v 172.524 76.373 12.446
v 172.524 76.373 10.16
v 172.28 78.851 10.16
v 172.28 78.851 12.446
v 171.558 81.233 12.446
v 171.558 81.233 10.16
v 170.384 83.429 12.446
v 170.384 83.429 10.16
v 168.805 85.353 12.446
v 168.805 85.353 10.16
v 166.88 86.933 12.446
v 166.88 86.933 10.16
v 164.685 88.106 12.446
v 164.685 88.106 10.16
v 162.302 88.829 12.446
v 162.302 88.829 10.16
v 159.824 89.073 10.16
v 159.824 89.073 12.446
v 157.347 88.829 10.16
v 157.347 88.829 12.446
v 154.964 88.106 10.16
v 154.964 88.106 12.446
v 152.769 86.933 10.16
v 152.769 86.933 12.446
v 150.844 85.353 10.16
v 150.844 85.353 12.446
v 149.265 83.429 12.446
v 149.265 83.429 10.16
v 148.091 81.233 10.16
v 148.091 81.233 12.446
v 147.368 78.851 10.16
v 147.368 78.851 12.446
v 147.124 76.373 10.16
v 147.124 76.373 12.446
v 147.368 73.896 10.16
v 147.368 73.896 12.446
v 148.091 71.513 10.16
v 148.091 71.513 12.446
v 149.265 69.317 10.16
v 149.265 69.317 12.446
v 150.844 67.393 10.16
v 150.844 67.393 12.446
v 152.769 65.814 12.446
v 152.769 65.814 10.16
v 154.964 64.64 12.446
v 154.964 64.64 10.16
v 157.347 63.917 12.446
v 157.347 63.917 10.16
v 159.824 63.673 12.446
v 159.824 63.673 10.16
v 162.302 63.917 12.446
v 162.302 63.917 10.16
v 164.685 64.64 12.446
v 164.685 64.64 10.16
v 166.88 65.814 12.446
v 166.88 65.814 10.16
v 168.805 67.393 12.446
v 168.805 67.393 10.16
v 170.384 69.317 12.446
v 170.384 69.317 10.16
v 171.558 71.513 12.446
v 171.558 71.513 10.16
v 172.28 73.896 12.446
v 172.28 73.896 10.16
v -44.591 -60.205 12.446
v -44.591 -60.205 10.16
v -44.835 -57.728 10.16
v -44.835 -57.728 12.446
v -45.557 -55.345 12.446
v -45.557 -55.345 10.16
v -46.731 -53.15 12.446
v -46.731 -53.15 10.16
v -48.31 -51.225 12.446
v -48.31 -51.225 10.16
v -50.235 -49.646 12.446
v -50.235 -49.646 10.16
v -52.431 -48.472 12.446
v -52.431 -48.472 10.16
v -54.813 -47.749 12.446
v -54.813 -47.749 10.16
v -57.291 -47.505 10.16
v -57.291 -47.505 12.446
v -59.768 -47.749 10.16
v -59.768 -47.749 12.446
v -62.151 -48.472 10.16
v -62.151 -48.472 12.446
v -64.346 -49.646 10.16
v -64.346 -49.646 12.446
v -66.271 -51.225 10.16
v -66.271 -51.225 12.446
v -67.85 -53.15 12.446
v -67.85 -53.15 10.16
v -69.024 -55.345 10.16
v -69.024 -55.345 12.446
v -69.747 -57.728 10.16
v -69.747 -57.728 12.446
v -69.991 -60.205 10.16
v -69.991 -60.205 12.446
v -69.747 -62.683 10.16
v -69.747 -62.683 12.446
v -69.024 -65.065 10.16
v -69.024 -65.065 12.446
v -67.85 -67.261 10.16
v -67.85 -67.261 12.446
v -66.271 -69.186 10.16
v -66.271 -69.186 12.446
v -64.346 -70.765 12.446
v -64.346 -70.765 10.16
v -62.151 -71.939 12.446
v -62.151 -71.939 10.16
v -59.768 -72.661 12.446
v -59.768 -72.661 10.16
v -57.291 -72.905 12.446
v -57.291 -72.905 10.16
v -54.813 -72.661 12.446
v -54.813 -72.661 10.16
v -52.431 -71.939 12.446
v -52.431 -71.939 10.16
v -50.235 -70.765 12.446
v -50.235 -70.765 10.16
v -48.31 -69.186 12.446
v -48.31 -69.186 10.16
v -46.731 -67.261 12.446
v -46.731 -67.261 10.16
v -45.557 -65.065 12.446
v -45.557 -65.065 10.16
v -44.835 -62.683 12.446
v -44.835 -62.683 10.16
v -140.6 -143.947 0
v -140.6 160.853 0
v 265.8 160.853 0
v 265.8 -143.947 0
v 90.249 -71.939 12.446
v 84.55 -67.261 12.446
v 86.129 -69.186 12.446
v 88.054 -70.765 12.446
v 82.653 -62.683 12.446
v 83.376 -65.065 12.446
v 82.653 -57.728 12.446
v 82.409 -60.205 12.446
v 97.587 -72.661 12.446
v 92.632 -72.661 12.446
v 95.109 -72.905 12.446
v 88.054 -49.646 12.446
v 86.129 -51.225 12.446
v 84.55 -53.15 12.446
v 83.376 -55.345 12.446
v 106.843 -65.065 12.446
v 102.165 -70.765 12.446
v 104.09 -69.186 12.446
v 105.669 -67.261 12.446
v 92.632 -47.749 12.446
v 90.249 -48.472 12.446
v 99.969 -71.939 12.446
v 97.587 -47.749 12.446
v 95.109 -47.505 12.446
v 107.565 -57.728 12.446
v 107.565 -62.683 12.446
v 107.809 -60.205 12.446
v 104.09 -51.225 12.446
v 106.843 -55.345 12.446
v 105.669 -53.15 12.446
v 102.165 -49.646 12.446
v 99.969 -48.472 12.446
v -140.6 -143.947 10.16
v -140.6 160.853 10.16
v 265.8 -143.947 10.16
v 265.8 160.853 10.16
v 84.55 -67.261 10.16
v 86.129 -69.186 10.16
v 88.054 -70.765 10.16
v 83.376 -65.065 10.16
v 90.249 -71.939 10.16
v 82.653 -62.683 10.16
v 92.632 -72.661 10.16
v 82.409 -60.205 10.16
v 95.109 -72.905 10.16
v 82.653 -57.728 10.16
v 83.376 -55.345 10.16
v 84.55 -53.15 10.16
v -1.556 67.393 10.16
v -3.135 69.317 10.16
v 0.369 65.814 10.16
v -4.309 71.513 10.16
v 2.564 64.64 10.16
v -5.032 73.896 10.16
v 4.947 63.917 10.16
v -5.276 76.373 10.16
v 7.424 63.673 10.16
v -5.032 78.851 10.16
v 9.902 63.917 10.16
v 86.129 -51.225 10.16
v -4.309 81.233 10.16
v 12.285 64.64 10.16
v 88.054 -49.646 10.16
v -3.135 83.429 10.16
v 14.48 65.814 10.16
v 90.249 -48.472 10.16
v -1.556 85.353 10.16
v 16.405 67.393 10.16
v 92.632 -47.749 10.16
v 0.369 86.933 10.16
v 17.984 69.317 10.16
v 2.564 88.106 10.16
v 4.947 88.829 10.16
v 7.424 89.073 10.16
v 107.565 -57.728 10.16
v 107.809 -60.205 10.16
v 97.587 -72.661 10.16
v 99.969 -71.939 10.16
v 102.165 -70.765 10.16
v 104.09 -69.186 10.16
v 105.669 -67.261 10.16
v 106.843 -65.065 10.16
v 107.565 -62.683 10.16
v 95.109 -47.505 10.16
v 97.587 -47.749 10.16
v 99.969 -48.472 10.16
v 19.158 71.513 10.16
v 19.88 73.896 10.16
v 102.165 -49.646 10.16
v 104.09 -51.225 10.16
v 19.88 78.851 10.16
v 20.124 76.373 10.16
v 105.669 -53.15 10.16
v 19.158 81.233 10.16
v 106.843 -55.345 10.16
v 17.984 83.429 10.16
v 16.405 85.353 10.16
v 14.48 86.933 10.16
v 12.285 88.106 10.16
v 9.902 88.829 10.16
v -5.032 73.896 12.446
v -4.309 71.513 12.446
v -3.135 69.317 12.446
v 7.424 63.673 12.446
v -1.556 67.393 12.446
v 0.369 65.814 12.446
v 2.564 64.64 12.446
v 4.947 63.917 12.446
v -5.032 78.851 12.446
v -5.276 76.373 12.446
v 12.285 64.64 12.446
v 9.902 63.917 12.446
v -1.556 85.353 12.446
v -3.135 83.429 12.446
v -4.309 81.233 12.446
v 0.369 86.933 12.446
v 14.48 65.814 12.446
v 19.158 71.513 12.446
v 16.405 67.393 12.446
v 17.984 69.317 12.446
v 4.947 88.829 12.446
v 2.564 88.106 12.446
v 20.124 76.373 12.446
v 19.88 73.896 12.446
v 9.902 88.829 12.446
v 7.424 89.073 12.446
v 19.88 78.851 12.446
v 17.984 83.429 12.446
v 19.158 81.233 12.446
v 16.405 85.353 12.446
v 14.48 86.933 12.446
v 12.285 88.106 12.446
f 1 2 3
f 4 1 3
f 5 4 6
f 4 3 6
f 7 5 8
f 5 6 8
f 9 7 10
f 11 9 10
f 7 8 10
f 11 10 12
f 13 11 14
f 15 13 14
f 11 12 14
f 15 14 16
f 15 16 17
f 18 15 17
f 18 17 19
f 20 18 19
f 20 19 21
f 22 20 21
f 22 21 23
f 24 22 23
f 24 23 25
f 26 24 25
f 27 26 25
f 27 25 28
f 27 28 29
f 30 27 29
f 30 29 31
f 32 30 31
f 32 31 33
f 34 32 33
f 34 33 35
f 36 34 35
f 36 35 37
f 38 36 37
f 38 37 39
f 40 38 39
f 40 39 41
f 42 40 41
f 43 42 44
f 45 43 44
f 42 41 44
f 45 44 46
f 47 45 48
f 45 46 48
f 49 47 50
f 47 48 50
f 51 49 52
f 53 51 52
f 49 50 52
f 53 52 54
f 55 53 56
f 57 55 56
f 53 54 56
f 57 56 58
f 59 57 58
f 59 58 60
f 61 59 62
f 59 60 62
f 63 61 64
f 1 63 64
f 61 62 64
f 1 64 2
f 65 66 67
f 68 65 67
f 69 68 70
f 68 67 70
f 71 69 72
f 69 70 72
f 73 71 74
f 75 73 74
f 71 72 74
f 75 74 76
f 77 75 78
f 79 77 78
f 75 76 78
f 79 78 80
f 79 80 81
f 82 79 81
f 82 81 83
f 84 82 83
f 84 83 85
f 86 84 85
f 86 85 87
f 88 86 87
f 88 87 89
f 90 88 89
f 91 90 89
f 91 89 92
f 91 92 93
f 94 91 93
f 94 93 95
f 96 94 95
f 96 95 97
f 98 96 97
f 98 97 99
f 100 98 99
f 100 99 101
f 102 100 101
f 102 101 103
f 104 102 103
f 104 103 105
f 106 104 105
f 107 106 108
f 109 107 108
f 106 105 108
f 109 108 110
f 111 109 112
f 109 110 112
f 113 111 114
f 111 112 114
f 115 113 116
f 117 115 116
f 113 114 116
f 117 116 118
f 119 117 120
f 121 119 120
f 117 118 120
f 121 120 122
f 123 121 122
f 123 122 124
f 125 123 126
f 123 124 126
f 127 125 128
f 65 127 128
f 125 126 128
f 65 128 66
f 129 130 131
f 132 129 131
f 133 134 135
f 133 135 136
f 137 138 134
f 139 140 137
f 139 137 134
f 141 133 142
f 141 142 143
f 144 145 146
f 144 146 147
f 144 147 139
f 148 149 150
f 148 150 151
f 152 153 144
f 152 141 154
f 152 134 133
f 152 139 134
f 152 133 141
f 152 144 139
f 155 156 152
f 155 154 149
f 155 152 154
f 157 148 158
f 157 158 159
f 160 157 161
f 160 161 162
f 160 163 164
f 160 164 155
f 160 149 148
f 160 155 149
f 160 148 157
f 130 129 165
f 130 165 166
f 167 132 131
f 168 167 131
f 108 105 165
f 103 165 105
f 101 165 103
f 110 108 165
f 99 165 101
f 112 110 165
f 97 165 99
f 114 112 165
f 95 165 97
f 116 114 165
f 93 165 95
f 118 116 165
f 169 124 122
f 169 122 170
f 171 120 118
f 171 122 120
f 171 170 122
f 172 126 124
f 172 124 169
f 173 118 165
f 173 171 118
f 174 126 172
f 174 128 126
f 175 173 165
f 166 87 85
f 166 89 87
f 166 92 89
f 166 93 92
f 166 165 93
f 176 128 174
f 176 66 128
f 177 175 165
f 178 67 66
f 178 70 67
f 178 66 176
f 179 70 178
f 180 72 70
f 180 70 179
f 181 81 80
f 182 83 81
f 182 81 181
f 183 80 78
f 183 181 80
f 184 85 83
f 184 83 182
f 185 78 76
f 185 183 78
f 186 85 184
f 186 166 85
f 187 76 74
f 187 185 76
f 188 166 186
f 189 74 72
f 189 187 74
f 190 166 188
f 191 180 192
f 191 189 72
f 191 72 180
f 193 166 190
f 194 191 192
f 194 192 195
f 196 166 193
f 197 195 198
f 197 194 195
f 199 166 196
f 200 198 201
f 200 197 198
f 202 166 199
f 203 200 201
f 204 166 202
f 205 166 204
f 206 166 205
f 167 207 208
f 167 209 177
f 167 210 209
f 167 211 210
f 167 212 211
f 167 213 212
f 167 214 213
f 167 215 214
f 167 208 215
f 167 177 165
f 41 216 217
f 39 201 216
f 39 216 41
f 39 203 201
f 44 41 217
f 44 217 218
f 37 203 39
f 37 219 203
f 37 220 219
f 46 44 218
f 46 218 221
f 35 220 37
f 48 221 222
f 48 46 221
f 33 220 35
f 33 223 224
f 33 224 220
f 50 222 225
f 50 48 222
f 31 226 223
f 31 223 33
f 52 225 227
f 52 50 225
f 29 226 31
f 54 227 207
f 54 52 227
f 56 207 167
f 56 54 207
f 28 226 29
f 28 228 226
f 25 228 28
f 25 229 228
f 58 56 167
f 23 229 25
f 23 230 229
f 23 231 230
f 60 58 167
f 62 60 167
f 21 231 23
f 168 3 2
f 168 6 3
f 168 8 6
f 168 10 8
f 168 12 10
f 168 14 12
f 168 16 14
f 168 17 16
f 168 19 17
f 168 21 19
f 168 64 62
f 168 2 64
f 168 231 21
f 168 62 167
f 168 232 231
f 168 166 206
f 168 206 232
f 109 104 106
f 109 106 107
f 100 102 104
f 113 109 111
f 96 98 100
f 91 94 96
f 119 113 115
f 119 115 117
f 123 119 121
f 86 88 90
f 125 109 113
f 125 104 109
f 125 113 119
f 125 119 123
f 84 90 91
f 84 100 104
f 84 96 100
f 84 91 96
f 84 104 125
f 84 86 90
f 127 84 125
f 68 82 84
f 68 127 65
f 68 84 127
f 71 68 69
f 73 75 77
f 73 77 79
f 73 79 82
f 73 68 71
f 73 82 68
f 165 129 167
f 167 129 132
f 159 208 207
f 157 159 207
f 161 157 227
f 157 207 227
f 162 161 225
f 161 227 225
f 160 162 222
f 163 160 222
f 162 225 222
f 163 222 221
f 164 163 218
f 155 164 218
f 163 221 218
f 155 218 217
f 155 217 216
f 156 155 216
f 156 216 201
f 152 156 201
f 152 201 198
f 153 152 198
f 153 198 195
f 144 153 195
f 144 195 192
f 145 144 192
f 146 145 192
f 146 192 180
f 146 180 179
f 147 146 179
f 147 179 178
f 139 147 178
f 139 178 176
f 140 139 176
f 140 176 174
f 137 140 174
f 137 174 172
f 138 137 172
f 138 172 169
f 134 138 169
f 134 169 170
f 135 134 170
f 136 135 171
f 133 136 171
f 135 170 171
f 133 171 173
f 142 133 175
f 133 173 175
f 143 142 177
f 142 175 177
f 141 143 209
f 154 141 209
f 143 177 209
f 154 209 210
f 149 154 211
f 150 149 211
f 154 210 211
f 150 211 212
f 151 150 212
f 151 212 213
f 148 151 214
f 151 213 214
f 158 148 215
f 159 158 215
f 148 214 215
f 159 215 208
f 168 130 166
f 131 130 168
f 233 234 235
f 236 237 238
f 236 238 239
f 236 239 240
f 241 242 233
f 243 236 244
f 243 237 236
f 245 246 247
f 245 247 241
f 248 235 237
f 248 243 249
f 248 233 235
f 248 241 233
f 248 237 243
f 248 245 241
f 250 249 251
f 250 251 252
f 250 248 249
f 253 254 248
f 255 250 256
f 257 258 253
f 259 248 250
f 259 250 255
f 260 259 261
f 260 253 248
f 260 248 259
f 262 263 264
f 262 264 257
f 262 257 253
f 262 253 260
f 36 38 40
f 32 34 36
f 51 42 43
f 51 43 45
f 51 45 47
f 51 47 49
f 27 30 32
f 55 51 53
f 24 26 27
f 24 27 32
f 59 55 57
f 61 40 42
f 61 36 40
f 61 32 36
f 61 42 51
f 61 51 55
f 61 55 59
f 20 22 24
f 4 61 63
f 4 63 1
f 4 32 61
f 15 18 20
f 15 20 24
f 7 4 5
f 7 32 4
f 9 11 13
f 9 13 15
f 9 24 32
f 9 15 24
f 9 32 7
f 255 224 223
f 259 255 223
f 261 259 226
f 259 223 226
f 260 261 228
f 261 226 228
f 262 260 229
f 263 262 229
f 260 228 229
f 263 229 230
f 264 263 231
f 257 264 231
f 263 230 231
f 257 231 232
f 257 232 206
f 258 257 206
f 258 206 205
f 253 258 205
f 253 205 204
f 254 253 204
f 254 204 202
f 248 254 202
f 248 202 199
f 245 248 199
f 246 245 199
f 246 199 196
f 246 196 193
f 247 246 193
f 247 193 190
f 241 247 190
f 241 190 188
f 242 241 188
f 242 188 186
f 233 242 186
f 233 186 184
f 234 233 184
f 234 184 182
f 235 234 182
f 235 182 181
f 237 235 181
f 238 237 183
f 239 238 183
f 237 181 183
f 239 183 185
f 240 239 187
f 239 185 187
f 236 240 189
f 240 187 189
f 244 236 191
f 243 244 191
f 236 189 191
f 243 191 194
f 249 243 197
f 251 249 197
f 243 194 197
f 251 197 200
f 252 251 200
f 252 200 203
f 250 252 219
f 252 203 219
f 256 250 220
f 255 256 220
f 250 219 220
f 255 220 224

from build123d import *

# Parameters (mm, degrees)
F0_R     = 12.7
F1_DEPTH = 12.446
F0_W     = 406.4
F0_H     = 304.8
F2_DEPTH = 10.16


with BuildPart() as f1:
    # F0 (on Top) → F1 (new body)
    with BuildSketch(Plane.XY):
        with Locations((7.4244239368, 76.3731971383)):
            Circle(F0_R)
    extrude(amount=F1_DEPTH)



with BuildPart() as f1b:
    # F0 (on Top) → F1, piece 2 (new body)
    with BuildSketch(Plane.XY):
        with Locations((159.8244239368, 76.3731971383)):
            Circle(F0_R)
    extrude(amount=F1_DEPTH)


with BuildPart() as f1c:
    # F0 (on Top) → F1, piece 3 (new body)
    with BuildSketch(Plane.XY):
        with Locations((-57.2906026376, -60.2052676494)):
            Circle(F0_R)
    extrude(amount=F1_DEPTH)


with BuildPart() as f1d:
    # F0 (on Top) → F1, piece 4 (new body)
    with BuildSketch(Plane.XY):
        with Locations((95.1093973624, -60.2052676494)):
            Circle(F0_R)
    extrude(amount=F1_DEPTH)


with BuildPart() as f1_1:
    add(f1.part)

    add(f1b.part)  # F2 merges F1b

    add(f1c.part)  # F2 merges F1c

    add(f1d.part)  # F2 merges F1d
    # F0 (on Top) → F2 (join)
    with BuildSketch(Plane.XY):
        with Locations((62.5996744812, 8.4529491862)):
            Rectangle(F0_W, F0_H)
        with Locations((-57.2906026376, -60.2052676494)):
            Circle(F0_R, mode=Mode.SUBTRACT)
        with Locations((95.1093973624, -60.2052676494)):
            Circle(F0_R, mode=Mode.SUBTRACT)
        with Locations((7.4244239368, 76.3731971383)):
            Circle(F0_R, mode=Mode.SUBTRACT)
        with Locations((159.8244239368, 76.3731971383)):
            Circle(F0_R, mode=Mode.SUBTRACT)
    extrude(amount=F2_DEPTH)


solid = f1_1.part
